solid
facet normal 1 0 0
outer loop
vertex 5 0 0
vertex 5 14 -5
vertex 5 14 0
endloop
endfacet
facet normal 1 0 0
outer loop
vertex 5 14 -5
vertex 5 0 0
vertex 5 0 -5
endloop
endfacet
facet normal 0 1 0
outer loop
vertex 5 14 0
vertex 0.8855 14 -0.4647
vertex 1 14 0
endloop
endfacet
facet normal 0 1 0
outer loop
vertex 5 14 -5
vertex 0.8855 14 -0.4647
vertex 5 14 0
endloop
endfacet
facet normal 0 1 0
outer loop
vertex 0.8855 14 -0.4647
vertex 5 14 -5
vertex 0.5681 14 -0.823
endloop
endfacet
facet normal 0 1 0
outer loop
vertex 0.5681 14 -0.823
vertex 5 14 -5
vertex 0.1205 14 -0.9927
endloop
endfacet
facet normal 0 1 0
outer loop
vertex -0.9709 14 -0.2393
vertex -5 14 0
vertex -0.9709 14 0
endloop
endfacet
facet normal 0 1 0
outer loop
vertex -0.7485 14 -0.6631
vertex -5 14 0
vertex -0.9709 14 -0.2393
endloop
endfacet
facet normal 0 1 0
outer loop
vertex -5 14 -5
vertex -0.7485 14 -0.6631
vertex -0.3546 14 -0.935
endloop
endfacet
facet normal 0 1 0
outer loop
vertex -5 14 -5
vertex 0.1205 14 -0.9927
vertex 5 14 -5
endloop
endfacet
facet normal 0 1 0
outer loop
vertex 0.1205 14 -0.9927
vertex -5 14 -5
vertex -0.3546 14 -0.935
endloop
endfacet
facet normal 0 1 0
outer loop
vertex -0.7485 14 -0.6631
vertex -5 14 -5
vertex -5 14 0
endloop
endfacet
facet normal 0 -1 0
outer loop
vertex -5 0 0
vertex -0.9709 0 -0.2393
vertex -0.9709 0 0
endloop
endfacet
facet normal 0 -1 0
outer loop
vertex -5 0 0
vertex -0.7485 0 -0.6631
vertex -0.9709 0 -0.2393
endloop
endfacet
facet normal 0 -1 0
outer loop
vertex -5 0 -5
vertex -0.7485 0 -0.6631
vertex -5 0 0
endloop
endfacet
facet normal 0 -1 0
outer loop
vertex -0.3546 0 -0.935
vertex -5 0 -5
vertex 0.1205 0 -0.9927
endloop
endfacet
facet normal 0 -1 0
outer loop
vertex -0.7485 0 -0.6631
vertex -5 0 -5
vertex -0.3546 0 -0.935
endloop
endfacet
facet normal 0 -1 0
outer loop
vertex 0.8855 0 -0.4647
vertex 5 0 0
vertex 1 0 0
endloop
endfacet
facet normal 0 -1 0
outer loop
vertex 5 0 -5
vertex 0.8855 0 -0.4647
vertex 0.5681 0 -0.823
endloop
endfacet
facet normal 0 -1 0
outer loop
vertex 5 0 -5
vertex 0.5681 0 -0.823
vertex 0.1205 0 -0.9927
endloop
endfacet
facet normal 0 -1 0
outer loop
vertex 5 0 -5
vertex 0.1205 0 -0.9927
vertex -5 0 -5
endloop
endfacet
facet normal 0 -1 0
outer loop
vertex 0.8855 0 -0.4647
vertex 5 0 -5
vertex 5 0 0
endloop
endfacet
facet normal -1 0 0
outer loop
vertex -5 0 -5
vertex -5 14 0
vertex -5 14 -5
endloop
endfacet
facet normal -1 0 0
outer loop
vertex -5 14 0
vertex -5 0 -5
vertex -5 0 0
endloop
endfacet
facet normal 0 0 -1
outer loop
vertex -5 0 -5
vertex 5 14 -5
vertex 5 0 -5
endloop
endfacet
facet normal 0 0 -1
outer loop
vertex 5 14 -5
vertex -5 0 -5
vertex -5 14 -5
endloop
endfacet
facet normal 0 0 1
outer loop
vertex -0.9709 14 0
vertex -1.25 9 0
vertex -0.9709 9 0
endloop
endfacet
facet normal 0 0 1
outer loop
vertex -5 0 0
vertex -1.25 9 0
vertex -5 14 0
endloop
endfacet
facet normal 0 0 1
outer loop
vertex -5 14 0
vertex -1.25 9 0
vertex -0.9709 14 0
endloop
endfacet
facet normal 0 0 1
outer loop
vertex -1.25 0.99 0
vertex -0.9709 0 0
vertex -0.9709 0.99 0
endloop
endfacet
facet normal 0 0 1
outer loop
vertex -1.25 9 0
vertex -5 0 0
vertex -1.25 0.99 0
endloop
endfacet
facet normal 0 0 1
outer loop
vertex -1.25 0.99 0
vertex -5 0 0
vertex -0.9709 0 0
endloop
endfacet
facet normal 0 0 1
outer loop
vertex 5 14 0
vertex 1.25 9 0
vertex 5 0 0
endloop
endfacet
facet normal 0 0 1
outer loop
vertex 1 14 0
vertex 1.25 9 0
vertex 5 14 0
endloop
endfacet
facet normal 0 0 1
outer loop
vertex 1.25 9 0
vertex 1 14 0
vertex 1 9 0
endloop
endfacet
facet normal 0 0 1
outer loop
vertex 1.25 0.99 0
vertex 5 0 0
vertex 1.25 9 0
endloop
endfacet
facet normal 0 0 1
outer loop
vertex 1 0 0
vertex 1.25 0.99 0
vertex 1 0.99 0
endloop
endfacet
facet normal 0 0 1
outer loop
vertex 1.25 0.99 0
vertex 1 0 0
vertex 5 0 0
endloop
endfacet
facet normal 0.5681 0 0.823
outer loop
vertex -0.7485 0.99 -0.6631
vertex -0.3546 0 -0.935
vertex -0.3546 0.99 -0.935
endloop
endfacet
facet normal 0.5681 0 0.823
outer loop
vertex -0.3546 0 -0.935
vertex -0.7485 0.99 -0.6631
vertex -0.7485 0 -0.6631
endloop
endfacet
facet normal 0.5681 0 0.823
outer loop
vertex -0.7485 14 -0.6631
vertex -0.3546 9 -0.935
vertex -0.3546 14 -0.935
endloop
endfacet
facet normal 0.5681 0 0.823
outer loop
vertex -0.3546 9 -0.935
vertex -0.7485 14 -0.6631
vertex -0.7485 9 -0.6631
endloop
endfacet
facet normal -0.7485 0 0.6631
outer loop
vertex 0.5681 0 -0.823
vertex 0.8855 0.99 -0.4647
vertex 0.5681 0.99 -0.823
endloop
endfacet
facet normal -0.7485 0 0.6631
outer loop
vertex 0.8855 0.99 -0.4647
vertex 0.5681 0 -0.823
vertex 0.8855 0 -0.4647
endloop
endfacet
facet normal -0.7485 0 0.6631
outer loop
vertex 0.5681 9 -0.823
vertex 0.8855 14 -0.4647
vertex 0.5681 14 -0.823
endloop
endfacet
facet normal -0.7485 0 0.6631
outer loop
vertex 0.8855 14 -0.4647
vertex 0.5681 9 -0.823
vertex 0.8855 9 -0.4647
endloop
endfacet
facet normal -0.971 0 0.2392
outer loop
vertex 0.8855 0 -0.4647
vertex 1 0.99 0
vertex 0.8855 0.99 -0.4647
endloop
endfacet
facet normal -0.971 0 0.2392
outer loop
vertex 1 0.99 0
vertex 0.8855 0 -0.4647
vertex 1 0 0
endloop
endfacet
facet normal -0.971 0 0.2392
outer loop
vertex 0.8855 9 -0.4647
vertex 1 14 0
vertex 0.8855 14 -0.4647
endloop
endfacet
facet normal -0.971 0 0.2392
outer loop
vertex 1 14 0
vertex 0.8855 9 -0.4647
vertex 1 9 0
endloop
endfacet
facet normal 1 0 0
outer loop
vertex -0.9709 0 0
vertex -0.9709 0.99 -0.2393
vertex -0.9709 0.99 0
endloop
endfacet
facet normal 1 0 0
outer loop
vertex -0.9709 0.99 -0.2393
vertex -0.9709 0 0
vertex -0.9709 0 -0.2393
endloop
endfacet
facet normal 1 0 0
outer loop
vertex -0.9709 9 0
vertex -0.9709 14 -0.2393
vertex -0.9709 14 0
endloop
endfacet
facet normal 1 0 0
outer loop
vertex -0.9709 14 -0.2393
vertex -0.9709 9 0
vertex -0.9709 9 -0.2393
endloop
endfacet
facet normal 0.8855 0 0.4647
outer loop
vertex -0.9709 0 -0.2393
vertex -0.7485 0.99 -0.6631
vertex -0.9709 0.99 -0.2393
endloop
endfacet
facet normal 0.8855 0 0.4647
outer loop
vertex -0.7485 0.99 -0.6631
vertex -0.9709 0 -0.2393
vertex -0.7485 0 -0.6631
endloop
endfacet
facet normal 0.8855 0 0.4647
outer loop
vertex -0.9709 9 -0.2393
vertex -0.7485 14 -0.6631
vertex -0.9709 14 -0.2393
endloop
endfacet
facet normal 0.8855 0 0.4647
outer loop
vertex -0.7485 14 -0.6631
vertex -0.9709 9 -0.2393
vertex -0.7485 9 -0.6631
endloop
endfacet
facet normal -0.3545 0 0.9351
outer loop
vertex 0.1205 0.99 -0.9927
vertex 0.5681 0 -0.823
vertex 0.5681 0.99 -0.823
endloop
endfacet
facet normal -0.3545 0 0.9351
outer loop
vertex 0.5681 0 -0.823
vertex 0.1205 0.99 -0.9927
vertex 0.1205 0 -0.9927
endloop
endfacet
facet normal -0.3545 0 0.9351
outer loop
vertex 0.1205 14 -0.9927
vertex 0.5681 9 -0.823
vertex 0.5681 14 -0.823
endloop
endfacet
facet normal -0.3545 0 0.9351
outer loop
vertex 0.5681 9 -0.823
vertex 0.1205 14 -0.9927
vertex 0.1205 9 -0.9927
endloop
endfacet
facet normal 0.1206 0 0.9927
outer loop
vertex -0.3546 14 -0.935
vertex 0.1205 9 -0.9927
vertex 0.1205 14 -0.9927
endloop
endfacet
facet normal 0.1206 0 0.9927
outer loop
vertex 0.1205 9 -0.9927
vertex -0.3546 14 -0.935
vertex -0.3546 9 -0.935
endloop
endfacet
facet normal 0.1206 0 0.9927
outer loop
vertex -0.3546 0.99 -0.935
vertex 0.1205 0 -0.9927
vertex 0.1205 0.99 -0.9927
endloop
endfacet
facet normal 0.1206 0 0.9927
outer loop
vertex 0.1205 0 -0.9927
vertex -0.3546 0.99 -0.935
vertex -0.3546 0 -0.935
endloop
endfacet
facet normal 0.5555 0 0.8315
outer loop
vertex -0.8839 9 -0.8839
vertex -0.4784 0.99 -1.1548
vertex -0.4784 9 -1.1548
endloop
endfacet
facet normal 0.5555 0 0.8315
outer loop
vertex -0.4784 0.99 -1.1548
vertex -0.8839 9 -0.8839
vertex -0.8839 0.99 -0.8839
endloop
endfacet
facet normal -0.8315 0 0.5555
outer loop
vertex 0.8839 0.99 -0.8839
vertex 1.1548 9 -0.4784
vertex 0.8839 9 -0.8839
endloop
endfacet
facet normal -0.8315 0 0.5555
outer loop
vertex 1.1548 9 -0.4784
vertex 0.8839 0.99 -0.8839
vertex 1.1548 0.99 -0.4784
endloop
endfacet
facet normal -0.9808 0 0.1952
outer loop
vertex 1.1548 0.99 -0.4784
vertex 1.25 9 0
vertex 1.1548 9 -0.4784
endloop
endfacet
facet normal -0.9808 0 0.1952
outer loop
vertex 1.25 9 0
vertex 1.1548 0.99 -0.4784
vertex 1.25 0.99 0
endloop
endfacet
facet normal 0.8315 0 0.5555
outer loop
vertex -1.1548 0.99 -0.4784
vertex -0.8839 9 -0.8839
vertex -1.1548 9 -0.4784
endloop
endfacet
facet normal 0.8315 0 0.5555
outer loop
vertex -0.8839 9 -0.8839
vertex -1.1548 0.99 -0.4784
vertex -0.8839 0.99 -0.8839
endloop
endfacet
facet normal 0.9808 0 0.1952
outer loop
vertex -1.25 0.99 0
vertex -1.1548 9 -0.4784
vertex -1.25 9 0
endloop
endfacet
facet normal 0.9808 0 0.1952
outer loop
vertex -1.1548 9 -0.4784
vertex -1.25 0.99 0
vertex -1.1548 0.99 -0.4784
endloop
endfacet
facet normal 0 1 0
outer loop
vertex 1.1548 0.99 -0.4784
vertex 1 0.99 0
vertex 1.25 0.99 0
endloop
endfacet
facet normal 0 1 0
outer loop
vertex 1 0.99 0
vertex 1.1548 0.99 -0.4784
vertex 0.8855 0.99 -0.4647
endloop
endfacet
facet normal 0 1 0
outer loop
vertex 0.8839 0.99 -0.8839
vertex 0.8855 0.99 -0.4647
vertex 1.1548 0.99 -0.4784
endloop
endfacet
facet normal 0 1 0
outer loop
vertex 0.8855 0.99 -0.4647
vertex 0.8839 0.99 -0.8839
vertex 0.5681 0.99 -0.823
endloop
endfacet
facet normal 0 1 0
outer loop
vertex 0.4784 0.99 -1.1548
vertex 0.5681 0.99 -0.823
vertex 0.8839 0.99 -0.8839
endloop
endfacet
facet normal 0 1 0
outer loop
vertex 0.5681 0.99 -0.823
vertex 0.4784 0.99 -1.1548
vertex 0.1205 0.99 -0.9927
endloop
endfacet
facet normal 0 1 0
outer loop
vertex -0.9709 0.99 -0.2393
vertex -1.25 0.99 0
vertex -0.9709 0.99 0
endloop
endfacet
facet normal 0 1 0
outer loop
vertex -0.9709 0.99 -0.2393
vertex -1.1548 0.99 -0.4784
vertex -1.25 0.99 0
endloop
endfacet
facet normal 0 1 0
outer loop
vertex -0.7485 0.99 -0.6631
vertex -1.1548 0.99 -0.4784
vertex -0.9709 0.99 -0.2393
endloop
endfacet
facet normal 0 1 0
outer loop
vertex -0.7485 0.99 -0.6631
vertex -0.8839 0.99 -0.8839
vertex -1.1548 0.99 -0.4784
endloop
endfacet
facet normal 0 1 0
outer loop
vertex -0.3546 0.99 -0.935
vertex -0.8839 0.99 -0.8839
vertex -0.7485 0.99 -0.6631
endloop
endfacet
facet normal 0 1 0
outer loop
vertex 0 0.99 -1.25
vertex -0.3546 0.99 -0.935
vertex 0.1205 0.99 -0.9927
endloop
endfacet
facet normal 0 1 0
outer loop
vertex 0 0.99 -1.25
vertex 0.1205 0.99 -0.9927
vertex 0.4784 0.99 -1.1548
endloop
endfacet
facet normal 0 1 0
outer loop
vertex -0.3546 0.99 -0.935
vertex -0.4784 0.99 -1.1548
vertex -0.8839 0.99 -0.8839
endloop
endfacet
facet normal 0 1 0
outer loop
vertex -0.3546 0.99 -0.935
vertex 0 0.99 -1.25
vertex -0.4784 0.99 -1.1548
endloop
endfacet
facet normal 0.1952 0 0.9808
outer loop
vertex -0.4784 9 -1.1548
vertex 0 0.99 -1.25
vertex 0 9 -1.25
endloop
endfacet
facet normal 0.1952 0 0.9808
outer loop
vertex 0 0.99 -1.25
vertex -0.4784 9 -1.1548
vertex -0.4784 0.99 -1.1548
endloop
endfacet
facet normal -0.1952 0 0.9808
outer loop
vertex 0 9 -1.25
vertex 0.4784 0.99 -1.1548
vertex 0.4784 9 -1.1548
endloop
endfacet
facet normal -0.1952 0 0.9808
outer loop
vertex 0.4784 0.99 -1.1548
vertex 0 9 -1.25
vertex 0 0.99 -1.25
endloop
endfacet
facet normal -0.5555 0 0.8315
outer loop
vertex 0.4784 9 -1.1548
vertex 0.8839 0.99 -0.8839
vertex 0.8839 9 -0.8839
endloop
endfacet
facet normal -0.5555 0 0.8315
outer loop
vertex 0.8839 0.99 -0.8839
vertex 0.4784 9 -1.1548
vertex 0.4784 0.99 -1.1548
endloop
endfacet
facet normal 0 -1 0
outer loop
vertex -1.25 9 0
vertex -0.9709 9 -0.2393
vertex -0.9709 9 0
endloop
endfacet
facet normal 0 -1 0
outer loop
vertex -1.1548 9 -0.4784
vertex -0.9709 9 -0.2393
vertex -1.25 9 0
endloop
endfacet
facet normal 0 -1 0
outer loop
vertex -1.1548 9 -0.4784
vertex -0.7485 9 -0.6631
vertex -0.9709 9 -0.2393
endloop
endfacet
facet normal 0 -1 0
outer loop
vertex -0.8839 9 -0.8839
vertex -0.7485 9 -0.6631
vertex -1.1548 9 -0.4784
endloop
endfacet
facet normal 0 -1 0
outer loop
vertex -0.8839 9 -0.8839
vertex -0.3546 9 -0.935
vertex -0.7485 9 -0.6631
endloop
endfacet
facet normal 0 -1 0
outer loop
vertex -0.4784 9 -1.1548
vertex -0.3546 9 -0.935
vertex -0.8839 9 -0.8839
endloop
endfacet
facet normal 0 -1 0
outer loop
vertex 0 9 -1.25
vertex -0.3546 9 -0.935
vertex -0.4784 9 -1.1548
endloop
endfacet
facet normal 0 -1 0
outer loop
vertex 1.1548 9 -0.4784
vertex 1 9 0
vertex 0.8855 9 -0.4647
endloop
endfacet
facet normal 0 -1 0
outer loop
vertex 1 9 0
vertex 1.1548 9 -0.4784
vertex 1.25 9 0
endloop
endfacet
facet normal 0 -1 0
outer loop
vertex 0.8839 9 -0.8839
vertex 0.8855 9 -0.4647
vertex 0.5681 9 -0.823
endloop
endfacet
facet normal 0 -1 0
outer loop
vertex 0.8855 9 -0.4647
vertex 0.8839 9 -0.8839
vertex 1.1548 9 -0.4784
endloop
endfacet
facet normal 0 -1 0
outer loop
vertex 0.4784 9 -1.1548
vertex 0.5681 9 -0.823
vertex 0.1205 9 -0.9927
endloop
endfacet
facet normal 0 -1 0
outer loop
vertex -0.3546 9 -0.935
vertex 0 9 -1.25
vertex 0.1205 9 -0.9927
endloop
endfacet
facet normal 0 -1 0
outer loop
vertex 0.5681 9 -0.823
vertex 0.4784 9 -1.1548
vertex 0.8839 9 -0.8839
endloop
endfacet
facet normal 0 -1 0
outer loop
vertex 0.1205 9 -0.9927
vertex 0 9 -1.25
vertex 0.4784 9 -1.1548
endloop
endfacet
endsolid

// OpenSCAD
// file: rgb_strip_to_fiber.scad
leds_per_meter = 60;
led_size = 5;
led_strip_width = 10;
led_strip_thickness = 2;

ferrule_dia = 6;
ferrule_depth = 12;
ferrule_insulation_dia = 10;
ferrule_insulation_height = 10;
ferrule_lip = [0.5, 1]; // ferrule wall thickness is 0.2

registration_block_size = [10, 10, 14];
registration_block_lip = 2;
led_register_lip = 4;
block_to_led = 5;

part_spacing = 0.2;
wall_thickness = 1.5;

m3_hole_size = 3.3;

$fa=0.5;
$fs=0.5;


/////// computed
led_stride = 1000/leds_per_meter;


smidge = 0.01;

module mockup(count, explode=0, half=0) {
  translate([0, explode * 10, 0])
    strip_base(count);
  if (!half)
    translate([0, explode * -10, 0])
      mirror([0, 1, 0])
        strip_base(count);

  translate([0, 0, -block_to_led])
    led_strip(count);
      translate([0 * led_stride, 0, 0])
        for (x = [0, half ? 0 : 1])
          rotate([0, 0, 90 + 180 * x])
            translate([0, max(0, explode * 5 - 2.5), 0])
              registration_block_awg_10(registration_block_size);

      translate([1 * led_stride, 0, 0])
        for (x = [0, half ? 0 : 1])
          rotate([0, 0, 90 + 180 * x])
            translate([0, max(0, explode * 5 - 2.5), 0])
              registration_block_awg_12(registration_block_size);

      translate([2 * led_stride, 0, 0])
        for (x = [0, half ? 0 : 1])
          rotate([0, 0, 90 + 180 * x])
            translate([0, max(0, explode * 5 - 2.5), 0])
              registration_block_awg_14(registration_block_size);
}

module strip_base(count) {
  registration_block_cutout = [registration_block_size.y + part_spacing,
                               registration_block_size.x + part_spacing,
                               registration_block_size.z + part_spacing];
  side_inset = 10;
  led_strip_cutout = led_strip_width + 1;

  housing_size = [(count -1) * led_stride + registration_block_cutout.x + wall_thickness * 2,
                  registration_block_cutout.y/2 + wall_thickness,
                  registration_block_cutout.z + wall_thickness * 2 + block_to_led];

  led_cutout = 5.5;
  fiber_cutout = registration_block_size.x - registration_block_lip;

  difference() {
    translate([-registration_block_cutout.x/2 - wall_thickness, 0, -wall_thickness - block_to_led])
      cube(housing_size);

    for (i = [0 : count - 1])
      translate([i * led_stride, 0, 0]) {
        registration_block_base(registration_block_cutout);
        translate([-led_cutout/2,-led_cutout/2, -block_to_led + smidge])
          cube([led_cutout, led_cutout, block_to_led]);
        translate([-fiber_cutout/2,-fiber_cutout/2, registration_block_cutout.z - smidge])
          cube([fiber_cutout, fiber_cutout, wall_thickness + smidge * 2]);
      }

    translate([-registration_block_cutout.x/2 - wall_thickness - smidge,
               -led_strip_cutout/2,
               -block_to_led -0])
      cube([housing_size.x + smidge * 2, led_strip_cutout, led_strip_thickness]);

    for (i = [0 : count - 2])
      translate([i * led_stride + led_stride/2, -smidge, registration_block_cutout.z/2]) {
        rotate([-90, 0, 0])
        cylinder(d=m3_hole_size, h=housing_size.y + smidge * 2);
      }

  }
}


// max 1 1mm fibers
module registration_block_awg_18(block_size=registration_block_size) {
  registration_block(block_size, 2.5, 8);
}

// max 3 1mm fibers
module registration_block_awg_14(block_size=registration_block_size) {
  registration_block(block_size, 3.4, 12);
}

// max 5 1mm fibers
module registration_block_awg_12(block_size=registration_block_size) {
  registration_block(block_size, 4, 12);
}

// max 7 1mm fibers
module registration_block_awg_10(block_size=registration_block_size) {
  registration_block(block_size, 4.7, 12);
}

module registration_block(block_size, ferrule_dia, ferrule_length) {
  difference() {
    intersection() {
      registration_block_base(block_size);
      translate([-block_size.x/2, 0])
        cube(block_size);
    }

    translate([0, 0, -smidge]) {
      cylinder(d=ferrule_dia - ferrule_lip.x, h=block_size.z + smidge * 2);
      translate([0, 0, ferrule_lip.y])
        cylinder(d=ferrule_dia, h=ferrule_length + smidge);
    }
  }
}

module registration_block_base(size) {
  translate([-size.x/2, -size.y/2])
    cube(size);
}

module ferrule_insulated() {
  taper_height = 2;

  translate([0, 0, -ferrule_depth])
    cylinder(d=ferrule_dia, h=ferrule_depth);

  translate([0, 0, taper_height])
    cylinder(d=ferrule_insulation_dia, h=ferrule_insulation_height-taper_height);
  cylinder(d1=ferrule_dia, d2=ferrule_insulation_dia, h=taper_height);

}

module led_strip(count) {
  translate([0, 0, 1]) {
  color("#fefefe")
  for (i = [0 : count - 1])
    translate([i * led_stride, 0, 0]) {
      translate([-led_size/2, -led_size/2, 0])
        cube([led_size, led_size, 2]);
    }

  color("#fcfcfc")
  translate([-led_stride/2, -led_strip_width/2, -1])
  cube([led_stride * count, led_strip_width, 1]);
  }
}
// main file
use <rgb_strip_to_fiber.scad>

rotate([-90, 0, 0])
  registration_block_awg_18();
